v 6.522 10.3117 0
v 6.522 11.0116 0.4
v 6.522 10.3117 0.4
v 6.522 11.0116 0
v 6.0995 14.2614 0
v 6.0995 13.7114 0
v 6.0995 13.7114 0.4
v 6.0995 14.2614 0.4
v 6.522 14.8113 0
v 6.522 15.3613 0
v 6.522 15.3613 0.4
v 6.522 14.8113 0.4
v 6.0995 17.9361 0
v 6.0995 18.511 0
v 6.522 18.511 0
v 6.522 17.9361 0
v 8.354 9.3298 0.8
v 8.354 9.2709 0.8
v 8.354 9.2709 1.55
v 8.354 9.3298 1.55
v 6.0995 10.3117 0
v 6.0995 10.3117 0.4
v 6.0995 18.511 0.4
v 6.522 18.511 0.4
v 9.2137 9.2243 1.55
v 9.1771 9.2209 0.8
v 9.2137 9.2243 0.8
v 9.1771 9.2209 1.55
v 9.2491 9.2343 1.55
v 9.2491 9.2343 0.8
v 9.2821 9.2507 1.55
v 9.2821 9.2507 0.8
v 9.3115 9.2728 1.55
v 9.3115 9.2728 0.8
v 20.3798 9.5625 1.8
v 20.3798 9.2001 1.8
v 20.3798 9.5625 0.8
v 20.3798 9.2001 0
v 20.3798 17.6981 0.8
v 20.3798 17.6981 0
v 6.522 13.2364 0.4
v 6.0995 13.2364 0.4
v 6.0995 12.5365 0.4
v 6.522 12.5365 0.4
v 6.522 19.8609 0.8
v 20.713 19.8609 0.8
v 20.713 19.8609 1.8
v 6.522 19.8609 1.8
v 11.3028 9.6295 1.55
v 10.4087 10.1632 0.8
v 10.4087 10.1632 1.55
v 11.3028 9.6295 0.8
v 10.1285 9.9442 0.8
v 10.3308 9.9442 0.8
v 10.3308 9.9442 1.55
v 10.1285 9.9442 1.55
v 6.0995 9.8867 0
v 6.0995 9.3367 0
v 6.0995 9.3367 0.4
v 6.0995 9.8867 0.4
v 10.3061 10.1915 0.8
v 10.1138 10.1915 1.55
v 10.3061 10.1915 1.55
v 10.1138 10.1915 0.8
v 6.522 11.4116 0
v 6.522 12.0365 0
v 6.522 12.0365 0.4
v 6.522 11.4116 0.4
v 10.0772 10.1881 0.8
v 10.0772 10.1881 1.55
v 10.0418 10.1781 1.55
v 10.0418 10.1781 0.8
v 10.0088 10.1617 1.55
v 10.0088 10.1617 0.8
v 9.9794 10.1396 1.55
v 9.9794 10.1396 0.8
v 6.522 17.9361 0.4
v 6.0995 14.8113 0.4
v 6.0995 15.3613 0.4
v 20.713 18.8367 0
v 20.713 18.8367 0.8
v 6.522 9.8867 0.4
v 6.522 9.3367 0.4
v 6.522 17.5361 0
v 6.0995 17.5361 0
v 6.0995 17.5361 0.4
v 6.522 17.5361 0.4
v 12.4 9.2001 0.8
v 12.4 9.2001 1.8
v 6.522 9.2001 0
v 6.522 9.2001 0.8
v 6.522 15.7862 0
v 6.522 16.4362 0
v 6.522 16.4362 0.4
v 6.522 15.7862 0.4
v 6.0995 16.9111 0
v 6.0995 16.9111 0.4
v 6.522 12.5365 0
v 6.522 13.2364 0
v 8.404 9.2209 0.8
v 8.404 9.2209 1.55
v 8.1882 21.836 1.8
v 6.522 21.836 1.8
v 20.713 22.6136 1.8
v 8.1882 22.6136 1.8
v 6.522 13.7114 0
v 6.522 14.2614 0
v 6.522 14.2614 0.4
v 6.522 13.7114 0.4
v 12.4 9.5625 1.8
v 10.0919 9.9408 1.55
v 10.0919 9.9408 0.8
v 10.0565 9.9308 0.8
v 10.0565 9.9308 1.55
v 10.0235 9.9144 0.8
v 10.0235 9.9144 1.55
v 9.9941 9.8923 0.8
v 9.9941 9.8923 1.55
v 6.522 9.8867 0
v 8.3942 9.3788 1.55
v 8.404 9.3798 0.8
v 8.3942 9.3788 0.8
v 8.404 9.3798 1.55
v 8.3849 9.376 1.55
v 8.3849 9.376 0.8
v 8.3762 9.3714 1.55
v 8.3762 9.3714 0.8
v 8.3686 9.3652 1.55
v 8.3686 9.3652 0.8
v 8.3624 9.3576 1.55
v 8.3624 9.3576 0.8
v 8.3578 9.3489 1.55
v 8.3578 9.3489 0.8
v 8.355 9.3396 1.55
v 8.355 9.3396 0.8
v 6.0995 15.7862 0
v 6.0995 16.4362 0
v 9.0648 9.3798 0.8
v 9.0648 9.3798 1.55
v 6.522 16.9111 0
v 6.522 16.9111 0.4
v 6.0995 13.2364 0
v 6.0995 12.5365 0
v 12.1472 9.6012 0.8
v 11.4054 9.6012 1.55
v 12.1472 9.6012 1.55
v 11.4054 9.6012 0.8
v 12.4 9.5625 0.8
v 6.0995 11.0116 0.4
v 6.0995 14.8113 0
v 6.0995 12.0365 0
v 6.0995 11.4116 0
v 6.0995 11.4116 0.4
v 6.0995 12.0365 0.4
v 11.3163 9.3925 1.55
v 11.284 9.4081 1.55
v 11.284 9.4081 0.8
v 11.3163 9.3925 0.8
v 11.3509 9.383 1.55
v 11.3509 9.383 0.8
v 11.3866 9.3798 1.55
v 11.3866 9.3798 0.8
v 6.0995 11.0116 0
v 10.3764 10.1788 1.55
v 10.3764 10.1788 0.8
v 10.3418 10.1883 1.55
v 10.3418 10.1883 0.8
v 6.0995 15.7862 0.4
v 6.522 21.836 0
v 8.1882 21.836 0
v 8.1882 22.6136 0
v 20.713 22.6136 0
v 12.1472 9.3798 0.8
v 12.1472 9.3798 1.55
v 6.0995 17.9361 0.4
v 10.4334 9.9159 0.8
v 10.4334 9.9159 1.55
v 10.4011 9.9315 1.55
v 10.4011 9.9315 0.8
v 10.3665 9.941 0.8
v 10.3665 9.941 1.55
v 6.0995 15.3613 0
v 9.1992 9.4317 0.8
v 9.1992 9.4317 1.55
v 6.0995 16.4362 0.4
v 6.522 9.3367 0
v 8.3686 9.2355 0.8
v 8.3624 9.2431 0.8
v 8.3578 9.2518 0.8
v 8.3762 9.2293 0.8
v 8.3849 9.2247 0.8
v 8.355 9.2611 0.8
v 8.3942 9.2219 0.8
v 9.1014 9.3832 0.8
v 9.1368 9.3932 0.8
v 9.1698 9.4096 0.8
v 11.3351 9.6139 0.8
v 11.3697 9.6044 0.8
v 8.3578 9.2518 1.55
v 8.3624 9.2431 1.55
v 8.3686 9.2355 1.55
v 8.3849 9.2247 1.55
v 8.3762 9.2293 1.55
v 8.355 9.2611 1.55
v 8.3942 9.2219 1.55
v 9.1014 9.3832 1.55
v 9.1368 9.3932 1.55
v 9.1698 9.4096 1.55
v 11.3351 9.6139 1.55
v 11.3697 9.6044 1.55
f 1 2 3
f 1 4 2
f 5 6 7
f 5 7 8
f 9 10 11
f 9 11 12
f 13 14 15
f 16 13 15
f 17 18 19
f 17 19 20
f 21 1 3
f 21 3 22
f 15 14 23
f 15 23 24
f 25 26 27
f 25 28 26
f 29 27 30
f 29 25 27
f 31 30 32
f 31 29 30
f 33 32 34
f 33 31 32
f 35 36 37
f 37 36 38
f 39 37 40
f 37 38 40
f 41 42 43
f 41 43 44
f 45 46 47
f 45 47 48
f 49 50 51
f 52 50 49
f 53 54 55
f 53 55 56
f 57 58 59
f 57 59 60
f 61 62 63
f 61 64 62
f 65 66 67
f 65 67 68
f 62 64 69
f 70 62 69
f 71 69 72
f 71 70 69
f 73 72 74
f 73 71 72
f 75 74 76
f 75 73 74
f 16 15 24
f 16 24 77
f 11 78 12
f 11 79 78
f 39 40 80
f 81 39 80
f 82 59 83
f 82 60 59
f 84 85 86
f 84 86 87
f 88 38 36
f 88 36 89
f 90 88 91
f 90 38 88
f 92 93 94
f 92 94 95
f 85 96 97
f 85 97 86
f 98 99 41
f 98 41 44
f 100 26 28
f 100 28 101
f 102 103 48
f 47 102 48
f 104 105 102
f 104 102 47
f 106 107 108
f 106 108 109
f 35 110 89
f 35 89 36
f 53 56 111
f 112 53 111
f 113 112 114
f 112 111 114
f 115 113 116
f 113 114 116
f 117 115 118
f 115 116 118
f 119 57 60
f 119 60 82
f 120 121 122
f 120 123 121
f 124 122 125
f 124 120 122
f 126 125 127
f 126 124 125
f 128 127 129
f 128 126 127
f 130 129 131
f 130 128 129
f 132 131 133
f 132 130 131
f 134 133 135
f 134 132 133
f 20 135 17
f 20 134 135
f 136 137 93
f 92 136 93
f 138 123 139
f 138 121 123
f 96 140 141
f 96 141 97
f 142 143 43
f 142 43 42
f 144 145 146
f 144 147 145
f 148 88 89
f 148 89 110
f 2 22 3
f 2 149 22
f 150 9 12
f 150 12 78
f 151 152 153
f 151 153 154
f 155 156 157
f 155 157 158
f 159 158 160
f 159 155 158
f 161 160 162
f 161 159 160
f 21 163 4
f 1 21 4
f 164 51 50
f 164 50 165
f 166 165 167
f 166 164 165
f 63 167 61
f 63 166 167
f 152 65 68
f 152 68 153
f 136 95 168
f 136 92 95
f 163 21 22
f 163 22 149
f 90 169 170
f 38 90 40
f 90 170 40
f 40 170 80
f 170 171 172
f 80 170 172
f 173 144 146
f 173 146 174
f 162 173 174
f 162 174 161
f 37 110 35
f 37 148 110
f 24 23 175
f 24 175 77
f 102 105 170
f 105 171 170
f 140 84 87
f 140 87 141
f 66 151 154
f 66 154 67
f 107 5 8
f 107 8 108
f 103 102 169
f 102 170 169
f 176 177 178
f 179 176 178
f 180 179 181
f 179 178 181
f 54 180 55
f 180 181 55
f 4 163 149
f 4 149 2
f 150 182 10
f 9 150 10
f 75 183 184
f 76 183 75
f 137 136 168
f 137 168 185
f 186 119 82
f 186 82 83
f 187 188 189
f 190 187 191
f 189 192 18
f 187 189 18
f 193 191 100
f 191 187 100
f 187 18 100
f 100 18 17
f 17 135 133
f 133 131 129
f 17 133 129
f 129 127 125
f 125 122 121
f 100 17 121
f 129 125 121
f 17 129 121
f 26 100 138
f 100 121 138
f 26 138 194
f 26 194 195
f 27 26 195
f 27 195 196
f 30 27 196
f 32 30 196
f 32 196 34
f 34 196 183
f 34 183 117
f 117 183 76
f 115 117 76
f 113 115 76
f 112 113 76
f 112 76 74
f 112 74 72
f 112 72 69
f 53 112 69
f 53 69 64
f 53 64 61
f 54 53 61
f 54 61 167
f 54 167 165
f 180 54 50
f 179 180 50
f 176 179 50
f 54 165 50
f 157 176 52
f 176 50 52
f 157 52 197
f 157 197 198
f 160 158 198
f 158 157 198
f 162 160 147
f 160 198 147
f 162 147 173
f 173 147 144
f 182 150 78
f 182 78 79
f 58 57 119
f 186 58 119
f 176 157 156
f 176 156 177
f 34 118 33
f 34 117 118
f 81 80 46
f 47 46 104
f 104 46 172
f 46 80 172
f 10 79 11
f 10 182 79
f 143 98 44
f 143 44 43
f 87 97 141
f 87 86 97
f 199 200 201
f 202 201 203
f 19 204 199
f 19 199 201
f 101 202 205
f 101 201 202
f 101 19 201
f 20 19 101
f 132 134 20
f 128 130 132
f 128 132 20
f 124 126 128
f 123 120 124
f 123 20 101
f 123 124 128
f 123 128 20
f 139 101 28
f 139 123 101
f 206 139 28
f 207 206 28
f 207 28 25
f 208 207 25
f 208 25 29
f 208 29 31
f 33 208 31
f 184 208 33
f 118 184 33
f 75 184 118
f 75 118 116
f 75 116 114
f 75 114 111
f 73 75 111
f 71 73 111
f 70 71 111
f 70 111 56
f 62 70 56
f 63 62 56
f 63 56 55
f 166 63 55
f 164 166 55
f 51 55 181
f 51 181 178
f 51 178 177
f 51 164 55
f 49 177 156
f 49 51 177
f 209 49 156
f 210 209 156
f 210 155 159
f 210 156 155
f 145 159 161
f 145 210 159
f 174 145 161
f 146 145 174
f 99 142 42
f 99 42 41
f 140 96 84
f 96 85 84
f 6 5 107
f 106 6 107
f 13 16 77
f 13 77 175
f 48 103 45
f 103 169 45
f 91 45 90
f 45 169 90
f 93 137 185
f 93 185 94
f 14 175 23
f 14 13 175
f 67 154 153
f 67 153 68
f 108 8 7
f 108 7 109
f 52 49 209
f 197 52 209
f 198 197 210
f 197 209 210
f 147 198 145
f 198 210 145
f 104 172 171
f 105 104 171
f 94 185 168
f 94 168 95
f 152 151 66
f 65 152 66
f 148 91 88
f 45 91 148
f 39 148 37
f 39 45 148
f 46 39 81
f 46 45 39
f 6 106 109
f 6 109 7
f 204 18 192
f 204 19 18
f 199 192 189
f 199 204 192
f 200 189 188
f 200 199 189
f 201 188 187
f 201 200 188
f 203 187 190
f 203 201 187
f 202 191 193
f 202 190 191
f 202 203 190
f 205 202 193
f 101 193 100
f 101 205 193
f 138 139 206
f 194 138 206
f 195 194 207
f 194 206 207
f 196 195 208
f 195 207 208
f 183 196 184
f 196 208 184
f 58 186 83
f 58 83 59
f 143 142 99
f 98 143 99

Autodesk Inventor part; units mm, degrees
ref_plane "YZ Plane" through (0, 0, 0) normal (1, 0, 0) x (0, 1, 0)
ref_plane "XZ Plane" through (0, 0, 0) normal (0, 1, 0) x (-1, 0, 0)
ref_plane "XY Plane" through (0, 0, 0) normal (0, 0, 1) x (1, 0, 0)
sketch "Sketch1" plane through (0, 0, 0) normal (0, 0, 1) x (1, 0, 0)
  line L0 (20.713, 22.6136) -> (8.1882, 22.6136)
  line L1 (8.1882, 22.6136) -> (8.1882, 21.836)
  line L2 (8.1882, 21.836) -> (6.522, 21.836)
  line L3 (6.522, 21.836) -> (6.522, 9.2001)
  line L4 (6.522, 9.2001) -> (20.3798, 9.2001)
  line L5 (20.3798, 9.2001) -> (20.3798, 17.6981)
  line L6 (20.3798, 17.6981) -> (20.713, 18.8367)
  line L7 (20.713, 18.8367) -> (20.713, 22.6136)
  point P0 (0, 0)
extrude "Extrusion1" add sketch "Sketch1" along normal blind 0.8
sketch "Sketch2" plane through (0, 0, 0.8) normal (0, 0, 1) x (1, 0, 0)
  line L0 (20.713, 22.6136) -> (8.1882, 22.6136) projected
  line L1 (20.713, 22.6136) -> (20.713, 19.8609)
  line L2 (20.713, 18.8367) -> (20.713, 22.6136) projected
  line L3 (20.713, 19.8609) -> (6.522, 19.8609)
  line L4 (6.522, 21.836) -> (6.522, 9.2001) projected
  line L5 (6.522, 19.8609) -> (6.522, 21.836)
  line L6 (8.1882, 21.836) -> (6.522, 21.836) projected
  line L7 (6.522, 21.836) -> (8.1882, 21.836)
  line L8 (8.1882, 22.6136) -> (8.1882, 21.836) projected
  line L9 (8.1882, 21.836) -> (8.1882, 22.6136)
  line L10 (8.1882, 22.6136) -> (20.713, 22.6136)
  line L11 (20.713, 19.8609) -> (6.522, 19.8609)
  point P0 (0, 0)
extrude "Extrusion2" add sketch "Sketch2" along normal blind 1
ref_plane "Work Plane1" through (0, 0, 0) normal (0, 0, 1) x (1, 0, 0)
sketch "Sketch3" plane through (0, 0, 0) normal (0, 0, 1) x (1, 0, 0)
  line L0 (6.522, 21.836) -> (6.522, 9.2001) projected
  line L1 (6.0995, 18.511) -> (6.522, 18.511)
  line L2 (6.522, 18.511) -> (6.522, 17.9361)
  line L3 (6.522, 17.9361) -> (6.0995, 17.9361)
  line L4 (6.0995, 17.9361) -> (6.0995, 18.511)
  line L5 (6.0995, 17.5361) -> (6.522, 17.5361)
  line L6 (6.522, 17.5361) -> (6.522, 16.9111)
  line L7 (6.522, 16.9111) -> (6.0995, 16.9111)
  line L8 (6.0995, 16.9111) -> (6.0995, 17.5361)
  line L9 (6.0995, 16.4362) -> (6.522, 16.4362)
  line L10 (6.522, 16.4362) -> (6.522, 15.7862)
  line L11 (6.522, 15.7862) -> (6.0995, 15.7862)
  line L12 (6.0995, 15.7862) -> (6.0995, 16.4362)
  line L13 (6.0995, 15.3613) -> (6.522, 15.3613)
  line L14 (6.522, 15.3613) -> (6.522, 14.8113)
  line L15 (6.522, 14.8113) -> (6.0995, 14.8113)
  line L16 (6.0995, 14.8113) -> (6.0995, 15.3613)
  line L17 (6.0995, 14.2614) -> (6.522, 14.2614)
  line L18 (6.522, 14.2614) -> (6.522, 13.7114)
  line L19 (6.522, 13.7114) -> (6.0995, 13.7114)
  line L20 (6.0995, 13.7114) -> (6.0995, 14.2614)
  line L21 (6.0995, 13.2364) -> (6.522, 13.2364)
  line L22 (6.522, 13.2364) -> (6.522, 12.5365)
  line L23 (6.522, 12.5365) -> (6.0995, 12.5365)
  line L24 (6.0995, 12.5365) -> (6.0995, 13.2364)
  line L25 (6.0995, 12.0365) -> (6.522, 12.0365)
  line L26 (6.522, 12.0365) -> (6.522, 11.4116)
  line L27 (6.522, 11.4116) -> (6.0995, 11.4116)
  line L28 (6.0995, 11.4116) -> (6.0995, 12.0365)
  line L29 (6.0995, 11.0116) -> (6.522, 11.0116)
  line L30 (6.522, 11.0116) -> (6.522, 10.3117)
  line L31 (6.522, 10.3117) -> (6.0995, 10.3117)
  line L32 (6.0995, 10.3117) -> (6.0995, 11.0116)
  line L33 (6.0995, 9.8867) -> (6.522, 9.8867)
  line L34 (6.522, 9.8867) -> (6.522, 9.3367)
  line L35 (6.522, 9.3367) -> (6.0995, 9.3367)
  line L36 (6.0995, 9.3367) -> (6.0995, 9.8867)
  point P0 (0, 0)
extrude "Extrusion3" add sketch "Sketch3" along normal blind 0.4 separate body
sketch "Sketch4" plane through (0, 0, 0.8) normal (0, 0, 1) x (1, 0, 0)
  line L0 (20.3798, 9.2001) -> (20.3798, 17.6981) projected
  line L1 (20.3798, 9.2001) -> (12.4, 9.2001)
  line L2 (12.4, 9.2001) -> (12.4, 9.5625)
  line L3 (12.4, 9.5625) -> (20.3798, 9.5625)
  line L4 (20.3798, 9.5625) -> (20.3798, 9.2001)
  point P0 (0, 0)
extrude "Extrusion4" add sketch "Sketch4" along normal blind 1 bodies 1
sketch "Sketch5" plane through (0, 0, 0.8) normal (0, 0, 1) x (1, 0, 0)
  line L0 (8.354, 9.3798) -> (9.142, 9.3798)
  line L1 (9.142, 9.3798) -> (10.0366, 10.1915)
  line L2 (10.0366, 10.1915) -> (10.3613, 10.1915)
  line L3 (10.3613, 10.1915) -> (11.3502, 9.6012)
  line L4 (11.3502, 9.6012) -> (12.1472, 9.6012)
  line L5 (12.1472, 9.6012) -> (12.1472, 9.3798)
  line L6 (12.1472, 9.3798) -> (11.3314, 9.3798)
  line L7 (11.3314, 9.3798) -> (10.386, 9.9442)
  line L8 (10.386, 9.9442) -> (10.0513, 9.9442)
  line L9 (10.0513, 9.9442) -> (9.2543, 9.2209)
  line L10 (9.2543, 9.2209) -> (8.354, 9.2209)
  line L11 (8.354, 9.2209) -> (8.354, 9.3798)
  point P0 (0, 0)
extrude "Extrusion5" add sketch "Sketch5" along normal blind 0.75 separate body
fillet "Fillet1" radius 0.05 2 edges at (8.354, 9.2209, 1.175) (8.354, 9.3798, 1.175)
fillet "Fillet2" radius 0.2 8 edges at (10.386, 9.9442, 1.175) (10.0513, 9.9442, 1.175) (9.2543, 9.2209, 1.175) (9.142, 9.3798, 1.175) (10.0366, 10.1915, 1.175) (10.3613, 10.1915, 1.175) (11.3502, 9.6012, 1.175) (11.3314, 9.3798, 1.175)
properties part number "SD_Center"
